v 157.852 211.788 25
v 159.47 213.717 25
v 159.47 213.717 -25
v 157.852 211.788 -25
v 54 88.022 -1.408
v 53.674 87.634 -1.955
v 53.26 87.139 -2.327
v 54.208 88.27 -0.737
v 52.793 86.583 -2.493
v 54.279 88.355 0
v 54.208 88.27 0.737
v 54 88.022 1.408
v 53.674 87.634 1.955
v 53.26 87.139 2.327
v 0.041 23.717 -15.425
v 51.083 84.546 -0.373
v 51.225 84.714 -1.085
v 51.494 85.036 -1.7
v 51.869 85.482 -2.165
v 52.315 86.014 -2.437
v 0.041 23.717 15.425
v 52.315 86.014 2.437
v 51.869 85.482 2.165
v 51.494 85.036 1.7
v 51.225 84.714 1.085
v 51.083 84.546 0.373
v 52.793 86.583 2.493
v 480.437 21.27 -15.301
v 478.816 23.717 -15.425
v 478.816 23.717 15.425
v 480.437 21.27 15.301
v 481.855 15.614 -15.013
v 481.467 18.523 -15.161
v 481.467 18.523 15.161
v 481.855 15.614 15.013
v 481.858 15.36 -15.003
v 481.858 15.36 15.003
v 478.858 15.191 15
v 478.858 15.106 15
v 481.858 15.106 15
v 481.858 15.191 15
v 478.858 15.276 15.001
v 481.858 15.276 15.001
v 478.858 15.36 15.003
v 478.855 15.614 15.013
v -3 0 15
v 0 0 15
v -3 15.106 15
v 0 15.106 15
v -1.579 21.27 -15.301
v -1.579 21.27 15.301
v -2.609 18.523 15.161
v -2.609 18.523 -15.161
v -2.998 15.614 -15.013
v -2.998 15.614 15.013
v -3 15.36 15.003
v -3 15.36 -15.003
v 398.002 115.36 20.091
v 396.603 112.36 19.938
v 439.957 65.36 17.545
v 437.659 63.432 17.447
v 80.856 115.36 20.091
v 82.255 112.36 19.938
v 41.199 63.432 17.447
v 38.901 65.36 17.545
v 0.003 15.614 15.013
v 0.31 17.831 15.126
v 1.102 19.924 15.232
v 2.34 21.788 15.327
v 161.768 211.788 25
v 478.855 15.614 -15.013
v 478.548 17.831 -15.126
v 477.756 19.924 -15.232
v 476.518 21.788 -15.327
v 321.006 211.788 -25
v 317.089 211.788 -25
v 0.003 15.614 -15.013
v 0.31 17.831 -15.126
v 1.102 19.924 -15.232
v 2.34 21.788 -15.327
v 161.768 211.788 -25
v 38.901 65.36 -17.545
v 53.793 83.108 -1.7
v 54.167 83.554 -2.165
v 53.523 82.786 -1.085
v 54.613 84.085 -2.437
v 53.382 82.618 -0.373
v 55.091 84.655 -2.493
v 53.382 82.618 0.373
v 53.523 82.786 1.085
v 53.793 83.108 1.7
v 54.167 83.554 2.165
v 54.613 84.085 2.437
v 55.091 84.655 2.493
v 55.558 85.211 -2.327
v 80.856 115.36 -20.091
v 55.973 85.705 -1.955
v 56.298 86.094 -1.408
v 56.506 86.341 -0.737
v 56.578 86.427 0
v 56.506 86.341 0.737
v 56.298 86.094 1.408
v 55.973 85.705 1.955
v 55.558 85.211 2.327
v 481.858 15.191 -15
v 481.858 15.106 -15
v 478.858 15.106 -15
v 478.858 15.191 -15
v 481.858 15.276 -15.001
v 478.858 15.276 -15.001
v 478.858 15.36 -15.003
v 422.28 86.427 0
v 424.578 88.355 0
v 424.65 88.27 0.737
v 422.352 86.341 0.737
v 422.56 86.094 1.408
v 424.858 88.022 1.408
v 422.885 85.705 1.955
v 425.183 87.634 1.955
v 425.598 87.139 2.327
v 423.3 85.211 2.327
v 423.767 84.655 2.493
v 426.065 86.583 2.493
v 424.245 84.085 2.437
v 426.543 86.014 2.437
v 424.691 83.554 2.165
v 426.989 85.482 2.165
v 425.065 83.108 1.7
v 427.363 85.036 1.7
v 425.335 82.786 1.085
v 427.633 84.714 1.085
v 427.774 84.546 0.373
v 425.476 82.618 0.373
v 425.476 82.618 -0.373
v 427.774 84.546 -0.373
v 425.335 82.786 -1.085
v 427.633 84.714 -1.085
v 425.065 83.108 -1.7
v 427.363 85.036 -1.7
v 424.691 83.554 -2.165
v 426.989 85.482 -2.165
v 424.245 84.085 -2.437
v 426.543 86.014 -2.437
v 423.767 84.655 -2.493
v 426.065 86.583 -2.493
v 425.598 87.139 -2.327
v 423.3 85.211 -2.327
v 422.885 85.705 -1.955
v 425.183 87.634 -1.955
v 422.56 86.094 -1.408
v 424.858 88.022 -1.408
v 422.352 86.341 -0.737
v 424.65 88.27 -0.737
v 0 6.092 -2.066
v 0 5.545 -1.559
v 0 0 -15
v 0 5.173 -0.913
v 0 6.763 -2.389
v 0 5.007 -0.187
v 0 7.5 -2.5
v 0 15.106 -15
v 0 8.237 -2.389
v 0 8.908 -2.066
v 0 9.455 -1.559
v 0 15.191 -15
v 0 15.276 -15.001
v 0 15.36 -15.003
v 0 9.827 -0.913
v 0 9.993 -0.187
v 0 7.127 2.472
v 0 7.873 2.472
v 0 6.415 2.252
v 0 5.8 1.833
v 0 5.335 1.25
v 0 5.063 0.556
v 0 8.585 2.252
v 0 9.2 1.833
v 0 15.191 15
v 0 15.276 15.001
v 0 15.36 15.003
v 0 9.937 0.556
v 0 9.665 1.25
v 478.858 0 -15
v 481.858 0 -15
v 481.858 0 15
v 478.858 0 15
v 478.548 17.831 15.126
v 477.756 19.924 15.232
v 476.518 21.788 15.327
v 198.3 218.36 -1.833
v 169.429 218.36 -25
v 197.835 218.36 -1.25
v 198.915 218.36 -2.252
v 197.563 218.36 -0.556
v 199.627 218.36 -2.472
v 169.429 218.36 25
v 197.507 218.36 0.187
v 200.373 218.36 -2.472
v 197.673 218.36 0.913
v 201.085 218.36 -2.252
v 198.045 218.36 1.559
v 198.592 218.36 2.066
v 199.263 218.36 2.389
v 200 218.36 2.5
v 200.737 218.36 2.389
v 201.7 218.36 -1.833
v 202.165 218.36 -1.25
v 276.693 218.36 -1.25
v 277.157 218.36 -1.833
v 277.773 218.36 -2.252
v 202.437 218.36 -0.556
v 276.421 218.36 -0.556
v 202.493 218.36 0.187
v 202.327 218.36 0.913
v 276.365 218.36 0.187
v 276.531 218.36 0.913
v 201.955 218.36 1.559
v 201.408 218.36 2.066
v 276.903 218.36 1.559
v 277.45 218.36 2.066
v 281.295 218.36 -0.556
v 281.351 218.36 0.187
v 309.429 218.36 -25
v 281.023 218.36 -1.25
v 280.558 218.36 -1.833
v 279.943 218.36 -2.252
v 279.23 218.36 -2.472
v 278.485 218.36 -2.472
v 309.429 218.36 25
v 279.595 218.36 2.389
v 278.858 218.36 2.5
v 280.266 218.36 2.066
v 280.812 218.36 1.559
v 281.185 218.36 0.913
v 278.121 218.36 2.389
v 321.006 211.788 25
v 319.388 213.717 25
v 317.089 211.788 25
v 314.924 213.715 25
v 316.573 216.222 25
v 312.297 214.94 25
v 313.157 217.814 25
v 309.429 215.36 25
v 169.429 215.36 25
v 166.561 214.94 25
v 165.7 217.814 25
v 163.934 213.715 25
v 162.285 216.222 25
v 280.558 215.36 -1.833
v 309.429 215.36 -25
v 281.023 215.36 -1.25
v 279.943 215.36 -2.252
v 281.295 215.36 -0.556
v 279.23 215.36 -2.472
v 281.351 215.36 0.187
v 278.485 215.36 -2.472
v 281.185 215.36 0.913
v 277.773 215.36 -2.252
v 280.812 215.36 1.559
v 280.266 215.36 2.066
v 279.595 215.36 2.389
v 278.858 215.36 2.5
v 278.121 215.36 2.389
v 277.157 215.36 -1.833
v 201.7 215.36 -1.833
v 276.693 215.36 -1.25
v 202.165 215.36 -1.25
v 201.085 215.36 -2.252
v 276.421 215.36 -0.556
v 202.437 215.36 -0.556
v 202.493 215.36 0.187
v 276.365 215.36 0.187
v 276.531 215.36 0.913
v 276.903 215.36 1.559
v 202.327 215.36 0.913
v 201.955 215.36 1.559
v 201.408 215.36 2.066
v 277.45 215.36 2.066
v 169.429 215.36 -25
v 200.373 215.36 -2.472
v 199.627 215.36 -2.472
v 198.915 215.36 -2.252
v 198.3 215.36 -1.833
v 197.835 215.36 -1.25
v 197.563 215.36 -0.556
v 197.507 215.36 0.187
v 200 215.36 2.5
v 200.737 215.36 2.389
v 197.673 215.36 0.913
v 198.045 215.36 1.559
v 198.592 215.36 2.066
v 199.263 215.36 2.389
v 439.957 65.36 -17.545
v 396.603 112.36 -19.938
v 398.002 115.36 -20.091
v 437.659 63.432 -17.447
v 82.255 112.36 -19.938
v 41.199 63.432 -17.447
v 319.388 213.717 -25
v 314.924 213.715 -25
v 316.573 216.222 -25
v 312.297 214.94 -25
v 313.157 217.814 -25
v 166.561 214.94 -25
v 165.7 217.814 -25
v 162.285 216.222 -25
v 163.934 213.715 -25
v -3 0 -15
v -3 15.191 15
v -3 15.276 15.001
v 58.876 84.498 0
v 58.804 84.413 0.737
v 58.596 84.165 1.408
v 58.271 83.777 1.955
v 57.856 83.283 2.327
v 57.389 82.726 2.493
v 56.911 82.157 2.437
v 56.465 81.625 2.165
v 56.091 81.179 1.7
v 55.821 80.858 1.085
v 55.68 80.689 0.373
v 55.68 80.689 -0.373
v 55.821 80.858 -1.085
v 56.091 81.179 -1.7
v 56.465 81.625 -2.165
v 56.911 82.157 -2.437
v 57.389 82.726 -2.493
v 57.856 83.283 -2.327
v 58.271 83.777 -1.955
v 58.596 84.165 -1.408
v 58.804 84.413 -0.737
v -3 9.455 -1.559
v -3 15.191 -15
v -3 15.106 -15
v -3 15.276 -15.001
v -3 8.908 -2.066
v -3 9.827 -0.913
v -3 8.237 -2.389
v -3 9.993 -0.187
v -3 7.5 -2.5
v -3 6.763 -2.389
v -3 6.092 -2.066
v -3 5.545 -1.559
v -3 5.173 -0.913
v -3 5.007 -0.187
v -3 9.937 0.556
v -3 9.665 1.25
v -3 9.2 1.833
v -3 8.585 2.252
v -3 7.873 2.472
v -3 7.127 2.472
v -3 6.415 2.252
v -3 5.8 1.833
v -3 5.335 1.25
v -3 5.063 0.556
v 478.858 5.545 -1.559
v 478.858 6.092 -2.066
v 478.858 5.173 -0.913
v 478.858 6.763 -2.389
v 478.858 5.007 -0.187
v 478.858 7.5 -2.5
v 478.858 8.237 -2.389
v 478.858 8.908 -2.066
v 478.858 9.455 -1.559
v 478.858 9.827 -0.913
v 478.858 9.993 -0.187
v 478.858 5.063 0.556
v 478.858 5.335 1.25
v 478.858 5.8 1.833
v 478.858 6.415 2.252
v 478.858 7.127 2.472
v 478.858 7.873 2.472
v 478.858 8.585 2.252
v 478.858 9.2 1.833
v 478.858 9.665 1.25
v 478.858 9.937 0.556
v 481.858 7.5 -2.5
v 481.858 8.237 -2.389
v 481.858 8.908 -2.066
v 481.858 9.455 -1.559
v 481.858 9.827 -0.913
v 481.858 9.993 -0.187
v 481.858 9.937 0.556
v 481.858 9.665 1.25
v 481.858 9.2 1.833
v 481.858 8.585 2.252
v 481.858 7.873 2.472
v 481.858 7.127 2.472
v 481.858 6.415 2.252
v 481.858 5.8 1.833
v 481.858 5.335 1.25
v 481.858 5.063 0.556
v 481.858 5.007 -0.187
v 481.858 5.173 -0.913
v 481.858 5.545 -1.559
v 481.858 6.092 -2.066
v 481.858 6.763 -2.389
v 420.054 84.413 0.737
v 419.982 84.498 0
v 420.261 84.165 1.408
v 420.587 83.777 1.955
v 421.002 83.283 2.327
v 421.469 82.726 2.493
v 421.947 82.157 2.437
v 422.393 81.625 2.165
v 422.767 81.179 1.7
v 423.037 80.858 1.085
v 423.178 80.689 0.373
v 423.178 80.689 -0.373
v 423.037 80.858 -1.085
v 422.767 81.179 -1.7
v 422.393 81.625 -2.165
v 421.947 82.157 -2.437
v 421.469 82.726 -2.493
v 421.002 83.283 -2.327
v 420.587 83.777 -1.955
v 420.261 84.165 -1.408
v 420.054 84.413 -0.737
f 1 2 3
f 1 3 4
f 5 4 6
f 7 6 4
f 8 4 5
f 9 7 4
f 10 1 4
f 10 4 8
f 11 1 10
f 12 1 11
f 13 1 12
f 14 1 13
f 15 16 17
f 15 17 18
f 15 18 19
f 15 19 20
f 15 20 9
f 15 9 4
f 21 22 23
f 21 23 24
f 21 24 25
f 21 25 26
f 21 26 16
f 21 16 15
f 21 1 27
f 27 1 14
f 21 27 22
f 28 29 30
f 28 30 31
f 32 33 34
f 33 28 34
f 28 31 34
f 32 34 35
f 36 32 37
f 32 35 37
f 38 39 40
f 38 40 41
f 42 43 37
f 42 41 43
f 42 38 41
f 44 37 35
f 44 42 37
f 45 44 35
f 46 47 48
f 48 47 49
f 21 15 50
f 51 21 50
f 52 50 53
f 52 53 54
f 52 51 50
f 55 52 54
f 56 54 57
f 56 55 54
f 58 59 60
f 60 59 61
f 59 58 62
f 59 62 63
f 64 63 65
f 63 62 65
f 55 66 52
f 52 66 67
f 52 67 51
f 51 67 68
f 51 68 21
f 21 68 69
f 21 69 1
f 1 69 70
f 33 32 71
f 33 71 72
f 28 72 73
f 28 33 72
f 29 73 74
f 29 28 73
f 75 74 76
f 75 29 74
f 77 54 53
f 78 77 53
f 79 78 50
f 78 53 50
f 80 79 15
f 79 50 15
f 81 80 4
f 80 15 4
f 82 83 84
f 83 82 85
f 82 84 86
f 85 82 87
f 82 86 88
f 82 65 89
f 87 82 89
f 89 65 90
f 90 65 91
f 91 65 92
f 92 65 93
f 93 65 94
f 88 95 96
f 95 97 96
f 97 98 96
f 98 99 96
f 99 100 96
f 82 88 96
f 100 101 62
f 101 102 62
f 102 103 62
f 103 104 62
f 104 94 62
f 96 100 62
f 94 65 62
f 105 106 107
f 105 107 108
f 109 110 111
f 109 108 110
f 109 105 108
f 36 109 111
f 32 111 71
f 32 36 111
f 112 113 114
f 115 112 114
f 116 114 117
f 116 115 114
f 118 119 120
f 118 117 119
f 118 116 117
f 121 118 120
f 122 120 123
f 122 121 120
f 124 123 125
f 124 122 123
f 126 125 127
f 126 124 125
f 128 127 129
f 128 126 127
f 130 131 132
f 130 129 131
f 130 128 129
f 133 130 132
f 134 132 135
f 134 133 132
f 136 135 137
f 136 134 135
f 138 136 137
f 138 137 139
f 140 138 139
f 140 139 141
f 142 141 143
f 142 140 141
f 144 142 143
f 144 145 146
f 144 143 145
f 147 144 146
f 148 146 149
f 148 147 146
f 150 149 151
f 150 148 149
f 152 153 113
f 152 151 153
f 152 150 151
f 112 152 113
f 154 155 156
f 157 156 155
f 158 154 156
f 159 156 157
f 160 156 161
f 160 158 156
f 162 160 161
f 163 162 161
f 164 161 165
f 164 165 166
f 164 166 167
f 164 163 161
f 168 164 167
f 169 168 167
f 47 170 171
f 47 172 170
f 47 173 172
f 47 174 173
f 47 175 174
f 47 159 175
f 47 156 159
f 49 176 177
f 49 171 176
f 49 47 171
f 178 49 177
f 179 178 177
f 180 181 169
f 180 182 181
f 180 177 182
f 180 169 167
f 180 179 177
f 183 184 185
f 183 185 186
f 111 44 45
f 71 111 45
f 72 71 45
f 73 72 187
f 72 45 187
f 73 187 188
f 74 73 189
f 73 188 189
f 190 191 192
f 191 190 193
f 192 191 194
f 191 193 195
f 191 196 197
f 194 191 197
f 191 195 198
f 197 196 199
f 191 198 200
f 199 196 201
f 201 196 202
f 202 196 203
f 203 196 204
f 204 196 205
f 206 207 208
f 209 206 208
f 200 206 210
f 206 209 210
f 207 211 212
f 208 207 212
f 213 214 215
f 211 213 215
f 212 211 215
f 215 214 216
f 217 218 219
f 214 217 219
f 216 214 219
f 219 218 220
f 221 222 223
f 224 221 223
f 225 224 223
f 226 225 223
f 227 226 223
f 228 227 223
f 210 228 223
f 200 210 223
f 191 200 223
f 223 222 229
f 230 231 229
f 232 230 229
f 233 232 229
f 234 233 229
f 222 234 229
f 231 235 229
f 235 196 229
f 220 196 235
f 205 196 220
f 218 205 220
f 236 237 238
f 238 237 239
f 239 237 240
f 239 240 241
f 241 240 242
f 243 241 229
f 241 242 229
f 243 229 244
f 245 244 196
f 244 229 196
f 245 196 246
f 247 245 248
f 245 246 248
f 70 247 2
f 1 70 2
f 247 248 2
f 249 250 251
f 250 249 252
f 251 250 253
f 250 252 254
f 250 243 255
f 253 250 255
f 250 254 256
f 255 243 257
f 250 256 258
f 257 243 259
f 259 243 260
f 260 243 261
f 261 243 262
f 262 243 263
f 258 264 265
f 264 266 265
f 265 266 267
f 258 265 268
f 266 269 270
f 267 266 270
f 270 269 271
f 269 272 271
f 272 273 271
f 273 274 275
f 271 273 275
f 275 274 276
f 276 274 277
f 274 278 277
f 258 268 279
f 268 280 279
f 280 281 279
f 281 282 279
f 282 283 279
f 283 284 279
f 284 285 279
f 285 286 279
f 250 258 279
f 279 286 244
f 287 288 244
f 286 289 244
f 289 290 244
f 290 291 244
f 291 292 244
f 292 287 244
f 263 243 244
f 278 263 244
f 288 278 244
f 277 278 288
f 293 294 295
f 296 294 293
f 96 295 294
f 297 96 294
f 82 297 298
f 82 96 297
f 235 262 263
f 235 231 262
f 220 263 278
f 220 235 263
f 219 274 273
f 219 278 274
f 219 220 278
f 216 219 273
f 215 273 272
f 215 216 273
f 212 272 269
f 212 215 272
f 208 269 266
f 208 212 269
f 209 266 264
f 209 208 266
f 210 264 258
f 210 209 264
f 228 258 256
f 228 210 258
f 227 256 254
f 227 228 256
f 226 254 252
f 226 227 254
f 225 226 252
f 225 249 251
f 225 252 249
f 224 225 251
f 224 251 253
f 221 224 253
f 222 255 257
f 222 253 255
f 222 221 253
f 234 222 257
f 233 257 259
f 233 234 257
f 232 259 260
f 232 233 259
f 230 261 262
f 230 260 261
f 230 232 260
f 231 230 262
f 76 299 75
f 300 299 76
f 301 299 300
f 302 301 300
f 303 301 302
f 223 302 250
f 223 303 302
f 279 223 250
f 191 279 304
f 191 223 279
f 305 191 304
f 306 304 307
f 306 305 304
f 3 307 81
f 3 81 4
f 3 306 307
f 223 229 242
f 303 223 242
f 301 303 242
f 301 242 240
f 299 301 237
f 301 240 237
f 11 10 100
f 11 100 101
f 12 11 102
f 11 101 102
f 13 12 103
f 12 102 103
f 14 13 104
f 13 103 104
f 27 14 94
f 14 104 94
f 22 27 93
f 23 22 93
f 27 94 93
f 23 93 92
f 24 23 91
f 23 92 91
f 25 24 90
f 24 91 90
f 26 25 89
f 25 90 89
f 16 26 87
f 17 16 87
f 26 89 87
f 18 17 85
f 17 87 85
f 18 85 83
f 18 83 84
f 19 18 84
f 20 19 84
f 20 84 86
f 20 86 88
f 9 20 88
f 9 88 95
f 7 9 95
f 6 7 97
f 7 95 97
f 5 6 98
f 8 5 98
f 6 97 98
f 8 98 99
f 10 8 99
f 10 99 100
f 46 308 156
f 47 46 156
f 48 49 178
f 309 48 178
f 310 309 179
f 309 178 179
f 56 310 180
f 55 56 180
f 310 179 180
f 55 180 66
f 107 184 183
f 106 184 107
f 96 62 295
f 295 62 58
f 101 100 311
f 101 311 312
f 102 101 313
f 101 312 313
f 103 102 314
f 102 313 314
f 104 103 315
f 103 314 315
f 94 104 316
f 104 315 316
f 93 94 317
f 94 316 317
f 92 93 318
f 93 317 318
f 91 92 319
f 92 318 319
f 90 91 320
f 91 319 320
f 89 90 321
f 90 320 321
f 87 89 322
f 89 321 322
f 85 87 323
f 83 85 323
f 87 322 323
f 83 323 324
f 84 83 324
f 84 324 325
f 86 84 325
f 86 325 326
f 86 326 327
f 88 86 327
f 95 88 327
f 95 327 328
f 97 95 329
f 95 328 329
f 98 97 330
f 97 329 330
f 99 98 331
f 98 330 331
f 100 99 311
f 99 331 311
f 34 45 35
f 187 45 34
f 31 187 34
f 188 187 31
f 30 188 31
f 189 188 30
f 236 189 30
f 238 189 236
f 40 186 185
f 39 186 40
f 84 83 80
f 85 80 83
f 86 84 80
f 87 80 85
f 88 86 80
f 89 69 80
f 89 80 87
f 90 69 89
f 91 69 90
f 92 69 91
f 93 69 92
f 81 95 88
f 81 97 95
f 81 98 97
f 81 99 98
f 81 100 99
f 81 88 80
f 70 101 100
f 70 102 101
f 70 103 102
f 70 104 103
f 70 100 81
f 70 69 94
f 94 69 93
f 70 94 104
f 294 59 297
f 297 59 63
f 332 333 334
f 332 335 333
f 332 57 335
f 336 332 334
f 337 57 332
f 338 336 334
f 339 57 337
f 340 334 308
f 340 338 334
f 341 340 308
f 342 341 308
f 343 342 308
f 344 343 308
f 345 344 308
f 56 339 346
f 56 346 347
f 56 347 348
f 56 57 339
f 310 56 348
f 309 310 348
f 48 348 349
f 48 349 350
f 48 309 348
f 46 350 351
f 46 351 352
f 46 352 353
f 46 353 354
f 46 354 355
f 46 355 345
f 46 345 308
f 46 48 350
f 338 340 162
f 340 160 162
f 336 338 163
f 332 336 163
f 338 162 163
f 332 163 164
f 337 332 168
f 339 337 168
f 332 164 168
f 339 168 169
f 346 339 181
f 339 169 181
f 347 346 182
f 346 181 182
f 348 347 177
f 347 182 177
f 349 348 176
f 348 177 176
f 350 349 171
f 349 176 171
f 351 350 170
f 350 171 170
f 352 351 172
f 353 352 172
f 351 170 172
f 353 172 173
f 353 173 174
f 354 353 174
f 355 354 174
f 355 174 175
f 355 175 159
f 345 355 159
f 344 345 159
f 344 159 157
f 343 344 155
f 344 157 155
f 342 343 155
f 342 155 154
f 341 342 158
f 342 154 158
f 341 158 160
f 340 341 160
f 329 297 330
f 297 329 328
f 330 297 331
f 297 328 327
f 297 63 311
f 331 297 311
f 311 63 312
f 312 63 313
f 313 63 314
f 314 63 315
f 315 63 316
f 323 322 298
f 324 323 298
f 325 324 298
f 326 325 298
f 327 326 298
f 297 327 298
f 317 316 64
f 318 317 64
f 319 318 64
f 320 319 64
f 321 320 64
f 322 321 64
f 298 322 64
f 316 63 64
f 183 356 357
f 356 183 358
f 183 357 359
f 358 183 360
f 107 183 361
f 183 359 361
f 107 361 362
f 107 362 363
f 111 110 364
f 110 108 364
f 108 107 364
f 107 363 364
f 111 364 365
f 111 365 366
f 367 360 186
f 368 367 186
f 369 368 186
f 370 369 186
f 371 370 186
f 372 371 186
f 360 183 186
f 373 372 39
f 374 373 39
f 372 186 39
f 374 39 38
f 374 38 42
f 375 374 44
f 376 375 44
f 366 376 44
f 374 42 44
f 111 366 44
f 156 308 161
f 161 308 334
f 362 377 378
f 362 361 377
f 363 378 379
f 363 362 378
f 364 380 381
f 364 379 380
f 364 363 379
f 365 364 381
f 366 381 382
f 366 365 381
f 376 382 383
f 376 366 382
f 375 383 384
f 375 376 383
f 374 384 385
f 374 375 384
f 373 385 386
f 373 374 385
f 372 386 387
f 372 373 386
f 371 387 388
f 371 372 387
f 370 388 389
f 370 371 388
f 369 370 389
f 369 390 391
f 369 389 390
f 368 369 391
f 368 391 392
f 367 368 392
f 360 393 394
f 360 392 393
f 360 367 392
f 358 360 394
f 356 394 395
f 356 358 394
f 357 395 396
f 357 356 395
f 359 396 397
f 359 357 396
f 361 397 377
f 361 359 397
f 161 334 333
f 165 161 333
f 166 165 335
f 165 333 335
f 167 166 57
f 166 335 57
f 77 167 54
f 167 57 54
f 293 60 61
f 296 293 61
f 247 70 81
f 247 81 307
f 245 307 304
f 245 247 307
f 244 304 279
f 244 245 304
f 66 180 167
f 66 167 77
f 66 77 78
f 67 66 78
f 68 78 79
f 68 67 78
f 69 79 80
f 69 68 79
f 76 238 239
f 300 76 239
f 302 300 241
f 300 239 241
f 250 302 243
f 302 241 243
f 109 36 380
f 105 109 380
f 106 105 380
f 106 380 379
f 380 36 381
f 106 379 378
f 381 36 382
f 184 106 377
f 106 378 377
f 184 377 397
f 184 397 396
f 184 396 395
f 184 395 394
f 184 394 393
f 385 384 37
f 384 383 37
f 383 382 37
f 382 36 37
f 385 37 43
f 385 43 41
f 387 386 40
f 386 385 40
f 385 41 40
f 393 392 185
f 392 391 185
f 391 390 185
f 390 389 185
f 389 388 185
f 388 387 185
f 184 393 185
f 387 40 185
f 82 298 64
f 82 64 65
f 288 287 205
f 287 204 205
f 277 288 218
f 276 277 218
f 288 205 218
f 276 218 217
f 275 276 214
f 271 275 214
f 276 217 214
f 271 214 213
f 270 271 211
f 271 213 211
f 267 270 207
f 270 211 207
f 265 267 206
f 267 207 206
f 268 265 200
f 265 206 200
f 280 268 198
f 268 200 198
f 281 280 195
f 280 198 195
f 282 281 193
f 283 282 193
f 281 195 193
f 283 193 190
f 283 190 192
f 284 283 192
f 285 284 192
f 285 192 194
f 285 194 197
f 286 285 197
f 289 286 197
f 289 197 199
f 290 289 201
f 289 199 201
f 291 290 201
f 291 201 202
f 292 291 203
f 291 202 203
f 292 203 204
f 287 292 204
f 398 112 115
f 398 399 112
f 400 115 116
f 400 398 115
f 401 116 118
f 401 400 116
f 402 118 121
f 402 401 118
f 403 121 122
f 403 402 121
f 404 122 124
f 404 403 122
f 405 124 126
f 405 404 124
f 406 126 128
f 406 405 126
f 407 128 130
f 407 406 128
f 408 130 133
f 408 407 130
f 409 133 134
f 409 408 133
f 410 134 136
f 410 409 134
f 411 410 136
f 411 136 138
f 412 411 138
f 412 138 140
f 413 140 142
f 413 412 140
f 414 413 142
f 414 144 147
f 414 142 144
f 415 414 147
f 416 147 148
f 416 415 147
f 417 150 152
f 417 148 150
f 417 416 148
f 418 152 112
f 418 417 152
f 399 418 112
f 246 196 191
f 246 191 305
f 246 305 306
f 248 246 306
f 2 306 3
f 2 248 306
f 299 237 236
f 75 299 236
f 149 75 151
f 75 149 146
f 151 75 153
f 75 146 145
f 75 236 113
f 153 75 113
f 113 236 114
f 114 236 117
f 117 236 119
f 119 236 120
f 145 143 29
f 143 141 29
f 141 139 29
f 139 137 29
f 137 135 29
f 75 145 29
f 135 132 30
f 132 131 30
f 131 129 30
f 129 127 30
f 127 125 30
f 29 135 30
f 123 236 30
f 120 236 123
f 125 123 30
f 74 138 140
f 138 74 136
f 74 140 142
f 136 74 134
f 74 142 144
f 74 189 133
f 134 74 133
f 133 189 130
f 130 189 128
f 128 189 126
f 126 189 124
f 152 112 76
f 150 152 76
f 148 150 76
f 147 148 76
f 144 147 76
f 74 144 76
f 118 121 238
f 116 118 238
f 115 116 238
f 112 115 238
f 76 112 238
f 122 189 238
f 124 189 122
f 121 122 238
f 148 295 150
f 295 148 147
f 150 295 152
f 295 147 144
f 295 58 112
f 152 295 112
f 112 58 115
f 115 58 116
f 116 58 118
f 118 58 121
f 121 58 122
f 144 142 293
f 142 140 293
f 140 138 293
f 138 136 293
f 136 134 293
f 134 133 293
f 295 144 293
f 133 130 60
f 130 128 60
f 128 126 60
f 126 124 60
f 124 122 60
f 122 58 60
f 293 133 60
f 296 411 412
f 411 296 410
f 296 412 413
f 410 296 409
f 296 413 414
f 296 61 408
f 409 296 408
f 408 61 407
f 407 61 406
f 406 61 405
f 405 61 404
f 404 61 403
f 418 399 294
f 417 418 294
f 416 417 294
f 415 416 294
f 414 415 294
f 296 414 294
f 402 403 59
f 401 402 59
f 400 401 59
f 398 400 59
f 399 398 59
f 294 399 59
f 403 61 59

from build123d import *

# Parameters (mm, degrees)
BOSS_EXTRUDE1_DEPTH     = 25
CUT_EXTRUDE1_DEPTH      = 275.690504759
SKETCH6_R               = 2.5
CUT_EXTRUDE3_DEPTH      = 326.011433764
SKETCH7_R               = 2.5
CUT_EXTRUDE4_DEPTH      = 275.690504819
BOSS_EXTRUDE2_DEPTH     = 50
CUT_EXTRUDE5_DEPTH      = 530.616103216
CUT_EXTRUDE5_DEPTH_BACK = 530.616103216
SKETCH11_R              = 2.5
CUT_EXTRUDE6_DEPTH      = 534.660292369


with BuildPart() as part:
    # Sketch2 → Boss-Extrude1 (new, symmetric)
    with BuildSketch(Plane.XY):
        with BuildLine():
            Line((0, 0), (0, 15.360297657))
            ThreePointArc((0, 15.360297657), (0.603073792, 18.780499091), (2.339555569, 21.788173754))
            Line((2.339555569, 21.788173754), (161.768485492, 211.788173754))
            ThreePointArc((161.768485492, 211.788173754), (165.202747306, 214.423375528), (169.428929924, 215.360297657))
            Line((169.428929924, 215.360297657), (239.428929924, 215.360297657))
            Line((239.428929924, 215.360297657), (239.428929924, 218.360297657))
            Line((239.428929924, 218.360297657), (169.428929924, 218.360297657))
            ThreePointArc((169.428929924, 218.360297657), (163.934892521, 217.142298889), (159.470352163, 213.716536583))
            Line((159.470352163, 213.716536583), (0.041422239, 23.716536583))
            ThreePointArc((0.041422239, 23.716536583), (-2.21600407, 19.806559521), (-3, 15.360297657))
            Line((-3, 15.360297657), (-3, 0))
            Line((-3, 0), (0, 0))
        make_face()
    boss_extrude1 = extrude(amount=BOSS_EXTRUDE1_DEPTH, both=True)

    # Sketch3 → Cut-Extrude1 (cut, symmetric)
    with BuildSketch(Plane(origin=(161.768485492, 0, 0), x_dir=(0, 0, -1), z_dir=(1, 0, 0))):
        with BuildLine():
            Line((25, 211.788173754), (25, 15.360297657))
            Line((25, 15.360297657), (25, 0))
            Line((25, 0), (15, 0))
            Line((15, 0), (15, 15.105916019))
            ThreePointArc((15, 15.105916019), (15.003233931, 15.360215392), (15.012933634, 15.614350288))
            Line((15.012933634, 15.614350288), (25, 211.788173754))
        make_face()
        with BuildLine():
            Line((-25, 211.788173754), (-25, 15.360297657))
            Line((-25, 15.360297657), (-25, 0))
            Line((-25, 0), (-15, 0))
            Line((-15, 0), (-15, 15.105916019))
            ThreePointArc((-15, 15.105916019), (-15.003233931, 15.360215392), (-15.012933634, 15.614350288))
            Line((-15.012933634, 15.614350288), (-25, 211.788173754))
        make_face()
    cut_extrude1 = extrude(amount=CUT_EXTRUDE1_DEPTH, both=True, mode=Mode.SUBTRACT)

    # Sketch6 → Cut-Extrude3 (cut, symmetric)
    with BuildSketch(Plane(origin=(0, 0, 0), x_dir=(1, 0, 0), z_dir=(0, 1, 0))):
        with Locations(Location((200, 0, 0), (0, 0, 270))):
            Circle(SKETCH6_R)
    cut_extrude3 = extrude(amount=CUT_EXTRUDE3_DEPTH, both=True, mode=Mode.SUBTRACT)

    # Sketch7 → Cut-Extrude4 (cut, symmetric)
    with BuildSketch(Plane(origin=(161.768485492, 0, 0), x_dir=(0, 0, -1), z_dir=(1, 0, 0))):
        with Locations((0, 7.5)):
            Circle(SKETCH7_R)
    cut_extrude4 = extrude(amount=CUT_EXTRUDE4_DEPTH, both=True, mode=Mode.SUBTRACT)

    # Mirror2: Boss-Extrude1, Cut-Extrude1, Cut-Extrude3, Cut-Extrude4 across plane
    add(boss_extrude1.mirror(Plane(origin=(239.428929924, 218.360297657, 25), x_dir=(0, 0, 1), z_dir=(-1, 0, 0))))
    add(cut_extrude1.mirror(Plane(origin=(239.428929924, 218.360297657, 25), x_dir=(0, 0, 1), z_dir=(-1, 0, 0))), mode=Mode.SUBTRACT)
    add(cut_extrude3.mirror(Plane(origin=(239.428929924, 218.360297657, 25), x_dir=(0, 0, 1), z_dir=(-1, 0, 0))), mode=Mode.SUBTRACT)
    add(cut_extrude4.mirror(Plane(origin=(239.428929924, 218.360297657, 25), x_dir=(0, 0, 1), z_dir=(-1, 0, 0))), mode=Mode.SUBTRACT)


with BuildPart() as body_2:
    # Sketch9 → Boss-Extrude2 (new body)
    with BuildSketch(Plane.XY.offset(25)):
        Polygon((80.855890224, 115.360297657), (398.001969623, 115.360297657), (439.956951182, 65.360297657), (437.658817852, 63.431934828), (396.603046648, 112.360297657), (82.254813199, 112.360297657), (41.199041995, 63.431934828), (38.900908666, 65.360297657), align=None)
    extrude(amount=-BOSS_EXTRUDE2_DEPTH)

    # Sketch10 → Cut-Extrude5 (cut, two sides: drawn at the far end of the back side and taken through both)
    with BuildSketch(Plane(origin=(0, 0, 0), x_dir=(0, 0, -1), z_dir=(1, 0, 0)).offset(-CUT_EXTRUDE5_DEPTH_BACK)):
        Polygon((25, 115.360297657), (20.090927112, 115.360297657), (17.44729201, 63.431934828), (25, 63.431934828), align=None)
        Polygon((-17.44729201, 63.431934828), (-25, 63.431934828), (-25, 115.360297657), (-20.090927112, 115.360297657), align=None)
    extrude(amount=CUT_EXTRUDE5_DEPTH + CUT_EXTRUDE5_DEPTH_BACK, mode=Mode.SUBTRACT)


with BuildPart() as cut_extrude6_tool:
    # Sketch11 → Cut-Extrude6 (new, symmetric)
    with BuildSketch(Plane(origin=(-7.057540324, 5.921979483, 0), x_dir=(0, 0, -1), z_dir=(0.7660444431189791, -0.6427876096865379, 0))):
        with Locations(Location((0, 100.073914917, 0), (0, 0, 90))):
            Circle(SKETCH11_R)
    cut_extrude6 = extrude(amount=CUT_EXTRUDE6_DEPTH, both=True)


with BuildPart() as part_1:
    add(part.part)

    # Cut-Extrude6: cut by cut_extrude6_tool
    add(cut_extrude6_tool.part, mode=Mode.SUBTRACT)


with BuildPart() as body_2_1:
    add(body_2.part)

    # Cut-Extrude6: cut by cut_extrude6_tool
    add(cut_extrude6_tool.part, mode=Mode.SUBTRACT)


with BuildPart() as mirror3_tool:
    # Mirror3: Cut-Extrude6 across plane
    add(cut_extrude6.mirror(Plane(origin=(239.428929924, 0, 0), x_dir=(0, 0, 1), z_dir=(1, 0, 0))))


with BuildPart() as part_2:
    add(part_1.part)

    # Mirror3: cut by mirror3_tool
    add(mirror3_tool.part, mode=Mode.SUBTRACT)


with BuildPart() as body_2_2:
    add(body_2_1.part)

    # Mirror3: cut by mirror3_tool
    add(mirror3_tool.part, mode=Mode.SUBTRACT)


solid = Compound([part_2.part, body_2_2.part])
